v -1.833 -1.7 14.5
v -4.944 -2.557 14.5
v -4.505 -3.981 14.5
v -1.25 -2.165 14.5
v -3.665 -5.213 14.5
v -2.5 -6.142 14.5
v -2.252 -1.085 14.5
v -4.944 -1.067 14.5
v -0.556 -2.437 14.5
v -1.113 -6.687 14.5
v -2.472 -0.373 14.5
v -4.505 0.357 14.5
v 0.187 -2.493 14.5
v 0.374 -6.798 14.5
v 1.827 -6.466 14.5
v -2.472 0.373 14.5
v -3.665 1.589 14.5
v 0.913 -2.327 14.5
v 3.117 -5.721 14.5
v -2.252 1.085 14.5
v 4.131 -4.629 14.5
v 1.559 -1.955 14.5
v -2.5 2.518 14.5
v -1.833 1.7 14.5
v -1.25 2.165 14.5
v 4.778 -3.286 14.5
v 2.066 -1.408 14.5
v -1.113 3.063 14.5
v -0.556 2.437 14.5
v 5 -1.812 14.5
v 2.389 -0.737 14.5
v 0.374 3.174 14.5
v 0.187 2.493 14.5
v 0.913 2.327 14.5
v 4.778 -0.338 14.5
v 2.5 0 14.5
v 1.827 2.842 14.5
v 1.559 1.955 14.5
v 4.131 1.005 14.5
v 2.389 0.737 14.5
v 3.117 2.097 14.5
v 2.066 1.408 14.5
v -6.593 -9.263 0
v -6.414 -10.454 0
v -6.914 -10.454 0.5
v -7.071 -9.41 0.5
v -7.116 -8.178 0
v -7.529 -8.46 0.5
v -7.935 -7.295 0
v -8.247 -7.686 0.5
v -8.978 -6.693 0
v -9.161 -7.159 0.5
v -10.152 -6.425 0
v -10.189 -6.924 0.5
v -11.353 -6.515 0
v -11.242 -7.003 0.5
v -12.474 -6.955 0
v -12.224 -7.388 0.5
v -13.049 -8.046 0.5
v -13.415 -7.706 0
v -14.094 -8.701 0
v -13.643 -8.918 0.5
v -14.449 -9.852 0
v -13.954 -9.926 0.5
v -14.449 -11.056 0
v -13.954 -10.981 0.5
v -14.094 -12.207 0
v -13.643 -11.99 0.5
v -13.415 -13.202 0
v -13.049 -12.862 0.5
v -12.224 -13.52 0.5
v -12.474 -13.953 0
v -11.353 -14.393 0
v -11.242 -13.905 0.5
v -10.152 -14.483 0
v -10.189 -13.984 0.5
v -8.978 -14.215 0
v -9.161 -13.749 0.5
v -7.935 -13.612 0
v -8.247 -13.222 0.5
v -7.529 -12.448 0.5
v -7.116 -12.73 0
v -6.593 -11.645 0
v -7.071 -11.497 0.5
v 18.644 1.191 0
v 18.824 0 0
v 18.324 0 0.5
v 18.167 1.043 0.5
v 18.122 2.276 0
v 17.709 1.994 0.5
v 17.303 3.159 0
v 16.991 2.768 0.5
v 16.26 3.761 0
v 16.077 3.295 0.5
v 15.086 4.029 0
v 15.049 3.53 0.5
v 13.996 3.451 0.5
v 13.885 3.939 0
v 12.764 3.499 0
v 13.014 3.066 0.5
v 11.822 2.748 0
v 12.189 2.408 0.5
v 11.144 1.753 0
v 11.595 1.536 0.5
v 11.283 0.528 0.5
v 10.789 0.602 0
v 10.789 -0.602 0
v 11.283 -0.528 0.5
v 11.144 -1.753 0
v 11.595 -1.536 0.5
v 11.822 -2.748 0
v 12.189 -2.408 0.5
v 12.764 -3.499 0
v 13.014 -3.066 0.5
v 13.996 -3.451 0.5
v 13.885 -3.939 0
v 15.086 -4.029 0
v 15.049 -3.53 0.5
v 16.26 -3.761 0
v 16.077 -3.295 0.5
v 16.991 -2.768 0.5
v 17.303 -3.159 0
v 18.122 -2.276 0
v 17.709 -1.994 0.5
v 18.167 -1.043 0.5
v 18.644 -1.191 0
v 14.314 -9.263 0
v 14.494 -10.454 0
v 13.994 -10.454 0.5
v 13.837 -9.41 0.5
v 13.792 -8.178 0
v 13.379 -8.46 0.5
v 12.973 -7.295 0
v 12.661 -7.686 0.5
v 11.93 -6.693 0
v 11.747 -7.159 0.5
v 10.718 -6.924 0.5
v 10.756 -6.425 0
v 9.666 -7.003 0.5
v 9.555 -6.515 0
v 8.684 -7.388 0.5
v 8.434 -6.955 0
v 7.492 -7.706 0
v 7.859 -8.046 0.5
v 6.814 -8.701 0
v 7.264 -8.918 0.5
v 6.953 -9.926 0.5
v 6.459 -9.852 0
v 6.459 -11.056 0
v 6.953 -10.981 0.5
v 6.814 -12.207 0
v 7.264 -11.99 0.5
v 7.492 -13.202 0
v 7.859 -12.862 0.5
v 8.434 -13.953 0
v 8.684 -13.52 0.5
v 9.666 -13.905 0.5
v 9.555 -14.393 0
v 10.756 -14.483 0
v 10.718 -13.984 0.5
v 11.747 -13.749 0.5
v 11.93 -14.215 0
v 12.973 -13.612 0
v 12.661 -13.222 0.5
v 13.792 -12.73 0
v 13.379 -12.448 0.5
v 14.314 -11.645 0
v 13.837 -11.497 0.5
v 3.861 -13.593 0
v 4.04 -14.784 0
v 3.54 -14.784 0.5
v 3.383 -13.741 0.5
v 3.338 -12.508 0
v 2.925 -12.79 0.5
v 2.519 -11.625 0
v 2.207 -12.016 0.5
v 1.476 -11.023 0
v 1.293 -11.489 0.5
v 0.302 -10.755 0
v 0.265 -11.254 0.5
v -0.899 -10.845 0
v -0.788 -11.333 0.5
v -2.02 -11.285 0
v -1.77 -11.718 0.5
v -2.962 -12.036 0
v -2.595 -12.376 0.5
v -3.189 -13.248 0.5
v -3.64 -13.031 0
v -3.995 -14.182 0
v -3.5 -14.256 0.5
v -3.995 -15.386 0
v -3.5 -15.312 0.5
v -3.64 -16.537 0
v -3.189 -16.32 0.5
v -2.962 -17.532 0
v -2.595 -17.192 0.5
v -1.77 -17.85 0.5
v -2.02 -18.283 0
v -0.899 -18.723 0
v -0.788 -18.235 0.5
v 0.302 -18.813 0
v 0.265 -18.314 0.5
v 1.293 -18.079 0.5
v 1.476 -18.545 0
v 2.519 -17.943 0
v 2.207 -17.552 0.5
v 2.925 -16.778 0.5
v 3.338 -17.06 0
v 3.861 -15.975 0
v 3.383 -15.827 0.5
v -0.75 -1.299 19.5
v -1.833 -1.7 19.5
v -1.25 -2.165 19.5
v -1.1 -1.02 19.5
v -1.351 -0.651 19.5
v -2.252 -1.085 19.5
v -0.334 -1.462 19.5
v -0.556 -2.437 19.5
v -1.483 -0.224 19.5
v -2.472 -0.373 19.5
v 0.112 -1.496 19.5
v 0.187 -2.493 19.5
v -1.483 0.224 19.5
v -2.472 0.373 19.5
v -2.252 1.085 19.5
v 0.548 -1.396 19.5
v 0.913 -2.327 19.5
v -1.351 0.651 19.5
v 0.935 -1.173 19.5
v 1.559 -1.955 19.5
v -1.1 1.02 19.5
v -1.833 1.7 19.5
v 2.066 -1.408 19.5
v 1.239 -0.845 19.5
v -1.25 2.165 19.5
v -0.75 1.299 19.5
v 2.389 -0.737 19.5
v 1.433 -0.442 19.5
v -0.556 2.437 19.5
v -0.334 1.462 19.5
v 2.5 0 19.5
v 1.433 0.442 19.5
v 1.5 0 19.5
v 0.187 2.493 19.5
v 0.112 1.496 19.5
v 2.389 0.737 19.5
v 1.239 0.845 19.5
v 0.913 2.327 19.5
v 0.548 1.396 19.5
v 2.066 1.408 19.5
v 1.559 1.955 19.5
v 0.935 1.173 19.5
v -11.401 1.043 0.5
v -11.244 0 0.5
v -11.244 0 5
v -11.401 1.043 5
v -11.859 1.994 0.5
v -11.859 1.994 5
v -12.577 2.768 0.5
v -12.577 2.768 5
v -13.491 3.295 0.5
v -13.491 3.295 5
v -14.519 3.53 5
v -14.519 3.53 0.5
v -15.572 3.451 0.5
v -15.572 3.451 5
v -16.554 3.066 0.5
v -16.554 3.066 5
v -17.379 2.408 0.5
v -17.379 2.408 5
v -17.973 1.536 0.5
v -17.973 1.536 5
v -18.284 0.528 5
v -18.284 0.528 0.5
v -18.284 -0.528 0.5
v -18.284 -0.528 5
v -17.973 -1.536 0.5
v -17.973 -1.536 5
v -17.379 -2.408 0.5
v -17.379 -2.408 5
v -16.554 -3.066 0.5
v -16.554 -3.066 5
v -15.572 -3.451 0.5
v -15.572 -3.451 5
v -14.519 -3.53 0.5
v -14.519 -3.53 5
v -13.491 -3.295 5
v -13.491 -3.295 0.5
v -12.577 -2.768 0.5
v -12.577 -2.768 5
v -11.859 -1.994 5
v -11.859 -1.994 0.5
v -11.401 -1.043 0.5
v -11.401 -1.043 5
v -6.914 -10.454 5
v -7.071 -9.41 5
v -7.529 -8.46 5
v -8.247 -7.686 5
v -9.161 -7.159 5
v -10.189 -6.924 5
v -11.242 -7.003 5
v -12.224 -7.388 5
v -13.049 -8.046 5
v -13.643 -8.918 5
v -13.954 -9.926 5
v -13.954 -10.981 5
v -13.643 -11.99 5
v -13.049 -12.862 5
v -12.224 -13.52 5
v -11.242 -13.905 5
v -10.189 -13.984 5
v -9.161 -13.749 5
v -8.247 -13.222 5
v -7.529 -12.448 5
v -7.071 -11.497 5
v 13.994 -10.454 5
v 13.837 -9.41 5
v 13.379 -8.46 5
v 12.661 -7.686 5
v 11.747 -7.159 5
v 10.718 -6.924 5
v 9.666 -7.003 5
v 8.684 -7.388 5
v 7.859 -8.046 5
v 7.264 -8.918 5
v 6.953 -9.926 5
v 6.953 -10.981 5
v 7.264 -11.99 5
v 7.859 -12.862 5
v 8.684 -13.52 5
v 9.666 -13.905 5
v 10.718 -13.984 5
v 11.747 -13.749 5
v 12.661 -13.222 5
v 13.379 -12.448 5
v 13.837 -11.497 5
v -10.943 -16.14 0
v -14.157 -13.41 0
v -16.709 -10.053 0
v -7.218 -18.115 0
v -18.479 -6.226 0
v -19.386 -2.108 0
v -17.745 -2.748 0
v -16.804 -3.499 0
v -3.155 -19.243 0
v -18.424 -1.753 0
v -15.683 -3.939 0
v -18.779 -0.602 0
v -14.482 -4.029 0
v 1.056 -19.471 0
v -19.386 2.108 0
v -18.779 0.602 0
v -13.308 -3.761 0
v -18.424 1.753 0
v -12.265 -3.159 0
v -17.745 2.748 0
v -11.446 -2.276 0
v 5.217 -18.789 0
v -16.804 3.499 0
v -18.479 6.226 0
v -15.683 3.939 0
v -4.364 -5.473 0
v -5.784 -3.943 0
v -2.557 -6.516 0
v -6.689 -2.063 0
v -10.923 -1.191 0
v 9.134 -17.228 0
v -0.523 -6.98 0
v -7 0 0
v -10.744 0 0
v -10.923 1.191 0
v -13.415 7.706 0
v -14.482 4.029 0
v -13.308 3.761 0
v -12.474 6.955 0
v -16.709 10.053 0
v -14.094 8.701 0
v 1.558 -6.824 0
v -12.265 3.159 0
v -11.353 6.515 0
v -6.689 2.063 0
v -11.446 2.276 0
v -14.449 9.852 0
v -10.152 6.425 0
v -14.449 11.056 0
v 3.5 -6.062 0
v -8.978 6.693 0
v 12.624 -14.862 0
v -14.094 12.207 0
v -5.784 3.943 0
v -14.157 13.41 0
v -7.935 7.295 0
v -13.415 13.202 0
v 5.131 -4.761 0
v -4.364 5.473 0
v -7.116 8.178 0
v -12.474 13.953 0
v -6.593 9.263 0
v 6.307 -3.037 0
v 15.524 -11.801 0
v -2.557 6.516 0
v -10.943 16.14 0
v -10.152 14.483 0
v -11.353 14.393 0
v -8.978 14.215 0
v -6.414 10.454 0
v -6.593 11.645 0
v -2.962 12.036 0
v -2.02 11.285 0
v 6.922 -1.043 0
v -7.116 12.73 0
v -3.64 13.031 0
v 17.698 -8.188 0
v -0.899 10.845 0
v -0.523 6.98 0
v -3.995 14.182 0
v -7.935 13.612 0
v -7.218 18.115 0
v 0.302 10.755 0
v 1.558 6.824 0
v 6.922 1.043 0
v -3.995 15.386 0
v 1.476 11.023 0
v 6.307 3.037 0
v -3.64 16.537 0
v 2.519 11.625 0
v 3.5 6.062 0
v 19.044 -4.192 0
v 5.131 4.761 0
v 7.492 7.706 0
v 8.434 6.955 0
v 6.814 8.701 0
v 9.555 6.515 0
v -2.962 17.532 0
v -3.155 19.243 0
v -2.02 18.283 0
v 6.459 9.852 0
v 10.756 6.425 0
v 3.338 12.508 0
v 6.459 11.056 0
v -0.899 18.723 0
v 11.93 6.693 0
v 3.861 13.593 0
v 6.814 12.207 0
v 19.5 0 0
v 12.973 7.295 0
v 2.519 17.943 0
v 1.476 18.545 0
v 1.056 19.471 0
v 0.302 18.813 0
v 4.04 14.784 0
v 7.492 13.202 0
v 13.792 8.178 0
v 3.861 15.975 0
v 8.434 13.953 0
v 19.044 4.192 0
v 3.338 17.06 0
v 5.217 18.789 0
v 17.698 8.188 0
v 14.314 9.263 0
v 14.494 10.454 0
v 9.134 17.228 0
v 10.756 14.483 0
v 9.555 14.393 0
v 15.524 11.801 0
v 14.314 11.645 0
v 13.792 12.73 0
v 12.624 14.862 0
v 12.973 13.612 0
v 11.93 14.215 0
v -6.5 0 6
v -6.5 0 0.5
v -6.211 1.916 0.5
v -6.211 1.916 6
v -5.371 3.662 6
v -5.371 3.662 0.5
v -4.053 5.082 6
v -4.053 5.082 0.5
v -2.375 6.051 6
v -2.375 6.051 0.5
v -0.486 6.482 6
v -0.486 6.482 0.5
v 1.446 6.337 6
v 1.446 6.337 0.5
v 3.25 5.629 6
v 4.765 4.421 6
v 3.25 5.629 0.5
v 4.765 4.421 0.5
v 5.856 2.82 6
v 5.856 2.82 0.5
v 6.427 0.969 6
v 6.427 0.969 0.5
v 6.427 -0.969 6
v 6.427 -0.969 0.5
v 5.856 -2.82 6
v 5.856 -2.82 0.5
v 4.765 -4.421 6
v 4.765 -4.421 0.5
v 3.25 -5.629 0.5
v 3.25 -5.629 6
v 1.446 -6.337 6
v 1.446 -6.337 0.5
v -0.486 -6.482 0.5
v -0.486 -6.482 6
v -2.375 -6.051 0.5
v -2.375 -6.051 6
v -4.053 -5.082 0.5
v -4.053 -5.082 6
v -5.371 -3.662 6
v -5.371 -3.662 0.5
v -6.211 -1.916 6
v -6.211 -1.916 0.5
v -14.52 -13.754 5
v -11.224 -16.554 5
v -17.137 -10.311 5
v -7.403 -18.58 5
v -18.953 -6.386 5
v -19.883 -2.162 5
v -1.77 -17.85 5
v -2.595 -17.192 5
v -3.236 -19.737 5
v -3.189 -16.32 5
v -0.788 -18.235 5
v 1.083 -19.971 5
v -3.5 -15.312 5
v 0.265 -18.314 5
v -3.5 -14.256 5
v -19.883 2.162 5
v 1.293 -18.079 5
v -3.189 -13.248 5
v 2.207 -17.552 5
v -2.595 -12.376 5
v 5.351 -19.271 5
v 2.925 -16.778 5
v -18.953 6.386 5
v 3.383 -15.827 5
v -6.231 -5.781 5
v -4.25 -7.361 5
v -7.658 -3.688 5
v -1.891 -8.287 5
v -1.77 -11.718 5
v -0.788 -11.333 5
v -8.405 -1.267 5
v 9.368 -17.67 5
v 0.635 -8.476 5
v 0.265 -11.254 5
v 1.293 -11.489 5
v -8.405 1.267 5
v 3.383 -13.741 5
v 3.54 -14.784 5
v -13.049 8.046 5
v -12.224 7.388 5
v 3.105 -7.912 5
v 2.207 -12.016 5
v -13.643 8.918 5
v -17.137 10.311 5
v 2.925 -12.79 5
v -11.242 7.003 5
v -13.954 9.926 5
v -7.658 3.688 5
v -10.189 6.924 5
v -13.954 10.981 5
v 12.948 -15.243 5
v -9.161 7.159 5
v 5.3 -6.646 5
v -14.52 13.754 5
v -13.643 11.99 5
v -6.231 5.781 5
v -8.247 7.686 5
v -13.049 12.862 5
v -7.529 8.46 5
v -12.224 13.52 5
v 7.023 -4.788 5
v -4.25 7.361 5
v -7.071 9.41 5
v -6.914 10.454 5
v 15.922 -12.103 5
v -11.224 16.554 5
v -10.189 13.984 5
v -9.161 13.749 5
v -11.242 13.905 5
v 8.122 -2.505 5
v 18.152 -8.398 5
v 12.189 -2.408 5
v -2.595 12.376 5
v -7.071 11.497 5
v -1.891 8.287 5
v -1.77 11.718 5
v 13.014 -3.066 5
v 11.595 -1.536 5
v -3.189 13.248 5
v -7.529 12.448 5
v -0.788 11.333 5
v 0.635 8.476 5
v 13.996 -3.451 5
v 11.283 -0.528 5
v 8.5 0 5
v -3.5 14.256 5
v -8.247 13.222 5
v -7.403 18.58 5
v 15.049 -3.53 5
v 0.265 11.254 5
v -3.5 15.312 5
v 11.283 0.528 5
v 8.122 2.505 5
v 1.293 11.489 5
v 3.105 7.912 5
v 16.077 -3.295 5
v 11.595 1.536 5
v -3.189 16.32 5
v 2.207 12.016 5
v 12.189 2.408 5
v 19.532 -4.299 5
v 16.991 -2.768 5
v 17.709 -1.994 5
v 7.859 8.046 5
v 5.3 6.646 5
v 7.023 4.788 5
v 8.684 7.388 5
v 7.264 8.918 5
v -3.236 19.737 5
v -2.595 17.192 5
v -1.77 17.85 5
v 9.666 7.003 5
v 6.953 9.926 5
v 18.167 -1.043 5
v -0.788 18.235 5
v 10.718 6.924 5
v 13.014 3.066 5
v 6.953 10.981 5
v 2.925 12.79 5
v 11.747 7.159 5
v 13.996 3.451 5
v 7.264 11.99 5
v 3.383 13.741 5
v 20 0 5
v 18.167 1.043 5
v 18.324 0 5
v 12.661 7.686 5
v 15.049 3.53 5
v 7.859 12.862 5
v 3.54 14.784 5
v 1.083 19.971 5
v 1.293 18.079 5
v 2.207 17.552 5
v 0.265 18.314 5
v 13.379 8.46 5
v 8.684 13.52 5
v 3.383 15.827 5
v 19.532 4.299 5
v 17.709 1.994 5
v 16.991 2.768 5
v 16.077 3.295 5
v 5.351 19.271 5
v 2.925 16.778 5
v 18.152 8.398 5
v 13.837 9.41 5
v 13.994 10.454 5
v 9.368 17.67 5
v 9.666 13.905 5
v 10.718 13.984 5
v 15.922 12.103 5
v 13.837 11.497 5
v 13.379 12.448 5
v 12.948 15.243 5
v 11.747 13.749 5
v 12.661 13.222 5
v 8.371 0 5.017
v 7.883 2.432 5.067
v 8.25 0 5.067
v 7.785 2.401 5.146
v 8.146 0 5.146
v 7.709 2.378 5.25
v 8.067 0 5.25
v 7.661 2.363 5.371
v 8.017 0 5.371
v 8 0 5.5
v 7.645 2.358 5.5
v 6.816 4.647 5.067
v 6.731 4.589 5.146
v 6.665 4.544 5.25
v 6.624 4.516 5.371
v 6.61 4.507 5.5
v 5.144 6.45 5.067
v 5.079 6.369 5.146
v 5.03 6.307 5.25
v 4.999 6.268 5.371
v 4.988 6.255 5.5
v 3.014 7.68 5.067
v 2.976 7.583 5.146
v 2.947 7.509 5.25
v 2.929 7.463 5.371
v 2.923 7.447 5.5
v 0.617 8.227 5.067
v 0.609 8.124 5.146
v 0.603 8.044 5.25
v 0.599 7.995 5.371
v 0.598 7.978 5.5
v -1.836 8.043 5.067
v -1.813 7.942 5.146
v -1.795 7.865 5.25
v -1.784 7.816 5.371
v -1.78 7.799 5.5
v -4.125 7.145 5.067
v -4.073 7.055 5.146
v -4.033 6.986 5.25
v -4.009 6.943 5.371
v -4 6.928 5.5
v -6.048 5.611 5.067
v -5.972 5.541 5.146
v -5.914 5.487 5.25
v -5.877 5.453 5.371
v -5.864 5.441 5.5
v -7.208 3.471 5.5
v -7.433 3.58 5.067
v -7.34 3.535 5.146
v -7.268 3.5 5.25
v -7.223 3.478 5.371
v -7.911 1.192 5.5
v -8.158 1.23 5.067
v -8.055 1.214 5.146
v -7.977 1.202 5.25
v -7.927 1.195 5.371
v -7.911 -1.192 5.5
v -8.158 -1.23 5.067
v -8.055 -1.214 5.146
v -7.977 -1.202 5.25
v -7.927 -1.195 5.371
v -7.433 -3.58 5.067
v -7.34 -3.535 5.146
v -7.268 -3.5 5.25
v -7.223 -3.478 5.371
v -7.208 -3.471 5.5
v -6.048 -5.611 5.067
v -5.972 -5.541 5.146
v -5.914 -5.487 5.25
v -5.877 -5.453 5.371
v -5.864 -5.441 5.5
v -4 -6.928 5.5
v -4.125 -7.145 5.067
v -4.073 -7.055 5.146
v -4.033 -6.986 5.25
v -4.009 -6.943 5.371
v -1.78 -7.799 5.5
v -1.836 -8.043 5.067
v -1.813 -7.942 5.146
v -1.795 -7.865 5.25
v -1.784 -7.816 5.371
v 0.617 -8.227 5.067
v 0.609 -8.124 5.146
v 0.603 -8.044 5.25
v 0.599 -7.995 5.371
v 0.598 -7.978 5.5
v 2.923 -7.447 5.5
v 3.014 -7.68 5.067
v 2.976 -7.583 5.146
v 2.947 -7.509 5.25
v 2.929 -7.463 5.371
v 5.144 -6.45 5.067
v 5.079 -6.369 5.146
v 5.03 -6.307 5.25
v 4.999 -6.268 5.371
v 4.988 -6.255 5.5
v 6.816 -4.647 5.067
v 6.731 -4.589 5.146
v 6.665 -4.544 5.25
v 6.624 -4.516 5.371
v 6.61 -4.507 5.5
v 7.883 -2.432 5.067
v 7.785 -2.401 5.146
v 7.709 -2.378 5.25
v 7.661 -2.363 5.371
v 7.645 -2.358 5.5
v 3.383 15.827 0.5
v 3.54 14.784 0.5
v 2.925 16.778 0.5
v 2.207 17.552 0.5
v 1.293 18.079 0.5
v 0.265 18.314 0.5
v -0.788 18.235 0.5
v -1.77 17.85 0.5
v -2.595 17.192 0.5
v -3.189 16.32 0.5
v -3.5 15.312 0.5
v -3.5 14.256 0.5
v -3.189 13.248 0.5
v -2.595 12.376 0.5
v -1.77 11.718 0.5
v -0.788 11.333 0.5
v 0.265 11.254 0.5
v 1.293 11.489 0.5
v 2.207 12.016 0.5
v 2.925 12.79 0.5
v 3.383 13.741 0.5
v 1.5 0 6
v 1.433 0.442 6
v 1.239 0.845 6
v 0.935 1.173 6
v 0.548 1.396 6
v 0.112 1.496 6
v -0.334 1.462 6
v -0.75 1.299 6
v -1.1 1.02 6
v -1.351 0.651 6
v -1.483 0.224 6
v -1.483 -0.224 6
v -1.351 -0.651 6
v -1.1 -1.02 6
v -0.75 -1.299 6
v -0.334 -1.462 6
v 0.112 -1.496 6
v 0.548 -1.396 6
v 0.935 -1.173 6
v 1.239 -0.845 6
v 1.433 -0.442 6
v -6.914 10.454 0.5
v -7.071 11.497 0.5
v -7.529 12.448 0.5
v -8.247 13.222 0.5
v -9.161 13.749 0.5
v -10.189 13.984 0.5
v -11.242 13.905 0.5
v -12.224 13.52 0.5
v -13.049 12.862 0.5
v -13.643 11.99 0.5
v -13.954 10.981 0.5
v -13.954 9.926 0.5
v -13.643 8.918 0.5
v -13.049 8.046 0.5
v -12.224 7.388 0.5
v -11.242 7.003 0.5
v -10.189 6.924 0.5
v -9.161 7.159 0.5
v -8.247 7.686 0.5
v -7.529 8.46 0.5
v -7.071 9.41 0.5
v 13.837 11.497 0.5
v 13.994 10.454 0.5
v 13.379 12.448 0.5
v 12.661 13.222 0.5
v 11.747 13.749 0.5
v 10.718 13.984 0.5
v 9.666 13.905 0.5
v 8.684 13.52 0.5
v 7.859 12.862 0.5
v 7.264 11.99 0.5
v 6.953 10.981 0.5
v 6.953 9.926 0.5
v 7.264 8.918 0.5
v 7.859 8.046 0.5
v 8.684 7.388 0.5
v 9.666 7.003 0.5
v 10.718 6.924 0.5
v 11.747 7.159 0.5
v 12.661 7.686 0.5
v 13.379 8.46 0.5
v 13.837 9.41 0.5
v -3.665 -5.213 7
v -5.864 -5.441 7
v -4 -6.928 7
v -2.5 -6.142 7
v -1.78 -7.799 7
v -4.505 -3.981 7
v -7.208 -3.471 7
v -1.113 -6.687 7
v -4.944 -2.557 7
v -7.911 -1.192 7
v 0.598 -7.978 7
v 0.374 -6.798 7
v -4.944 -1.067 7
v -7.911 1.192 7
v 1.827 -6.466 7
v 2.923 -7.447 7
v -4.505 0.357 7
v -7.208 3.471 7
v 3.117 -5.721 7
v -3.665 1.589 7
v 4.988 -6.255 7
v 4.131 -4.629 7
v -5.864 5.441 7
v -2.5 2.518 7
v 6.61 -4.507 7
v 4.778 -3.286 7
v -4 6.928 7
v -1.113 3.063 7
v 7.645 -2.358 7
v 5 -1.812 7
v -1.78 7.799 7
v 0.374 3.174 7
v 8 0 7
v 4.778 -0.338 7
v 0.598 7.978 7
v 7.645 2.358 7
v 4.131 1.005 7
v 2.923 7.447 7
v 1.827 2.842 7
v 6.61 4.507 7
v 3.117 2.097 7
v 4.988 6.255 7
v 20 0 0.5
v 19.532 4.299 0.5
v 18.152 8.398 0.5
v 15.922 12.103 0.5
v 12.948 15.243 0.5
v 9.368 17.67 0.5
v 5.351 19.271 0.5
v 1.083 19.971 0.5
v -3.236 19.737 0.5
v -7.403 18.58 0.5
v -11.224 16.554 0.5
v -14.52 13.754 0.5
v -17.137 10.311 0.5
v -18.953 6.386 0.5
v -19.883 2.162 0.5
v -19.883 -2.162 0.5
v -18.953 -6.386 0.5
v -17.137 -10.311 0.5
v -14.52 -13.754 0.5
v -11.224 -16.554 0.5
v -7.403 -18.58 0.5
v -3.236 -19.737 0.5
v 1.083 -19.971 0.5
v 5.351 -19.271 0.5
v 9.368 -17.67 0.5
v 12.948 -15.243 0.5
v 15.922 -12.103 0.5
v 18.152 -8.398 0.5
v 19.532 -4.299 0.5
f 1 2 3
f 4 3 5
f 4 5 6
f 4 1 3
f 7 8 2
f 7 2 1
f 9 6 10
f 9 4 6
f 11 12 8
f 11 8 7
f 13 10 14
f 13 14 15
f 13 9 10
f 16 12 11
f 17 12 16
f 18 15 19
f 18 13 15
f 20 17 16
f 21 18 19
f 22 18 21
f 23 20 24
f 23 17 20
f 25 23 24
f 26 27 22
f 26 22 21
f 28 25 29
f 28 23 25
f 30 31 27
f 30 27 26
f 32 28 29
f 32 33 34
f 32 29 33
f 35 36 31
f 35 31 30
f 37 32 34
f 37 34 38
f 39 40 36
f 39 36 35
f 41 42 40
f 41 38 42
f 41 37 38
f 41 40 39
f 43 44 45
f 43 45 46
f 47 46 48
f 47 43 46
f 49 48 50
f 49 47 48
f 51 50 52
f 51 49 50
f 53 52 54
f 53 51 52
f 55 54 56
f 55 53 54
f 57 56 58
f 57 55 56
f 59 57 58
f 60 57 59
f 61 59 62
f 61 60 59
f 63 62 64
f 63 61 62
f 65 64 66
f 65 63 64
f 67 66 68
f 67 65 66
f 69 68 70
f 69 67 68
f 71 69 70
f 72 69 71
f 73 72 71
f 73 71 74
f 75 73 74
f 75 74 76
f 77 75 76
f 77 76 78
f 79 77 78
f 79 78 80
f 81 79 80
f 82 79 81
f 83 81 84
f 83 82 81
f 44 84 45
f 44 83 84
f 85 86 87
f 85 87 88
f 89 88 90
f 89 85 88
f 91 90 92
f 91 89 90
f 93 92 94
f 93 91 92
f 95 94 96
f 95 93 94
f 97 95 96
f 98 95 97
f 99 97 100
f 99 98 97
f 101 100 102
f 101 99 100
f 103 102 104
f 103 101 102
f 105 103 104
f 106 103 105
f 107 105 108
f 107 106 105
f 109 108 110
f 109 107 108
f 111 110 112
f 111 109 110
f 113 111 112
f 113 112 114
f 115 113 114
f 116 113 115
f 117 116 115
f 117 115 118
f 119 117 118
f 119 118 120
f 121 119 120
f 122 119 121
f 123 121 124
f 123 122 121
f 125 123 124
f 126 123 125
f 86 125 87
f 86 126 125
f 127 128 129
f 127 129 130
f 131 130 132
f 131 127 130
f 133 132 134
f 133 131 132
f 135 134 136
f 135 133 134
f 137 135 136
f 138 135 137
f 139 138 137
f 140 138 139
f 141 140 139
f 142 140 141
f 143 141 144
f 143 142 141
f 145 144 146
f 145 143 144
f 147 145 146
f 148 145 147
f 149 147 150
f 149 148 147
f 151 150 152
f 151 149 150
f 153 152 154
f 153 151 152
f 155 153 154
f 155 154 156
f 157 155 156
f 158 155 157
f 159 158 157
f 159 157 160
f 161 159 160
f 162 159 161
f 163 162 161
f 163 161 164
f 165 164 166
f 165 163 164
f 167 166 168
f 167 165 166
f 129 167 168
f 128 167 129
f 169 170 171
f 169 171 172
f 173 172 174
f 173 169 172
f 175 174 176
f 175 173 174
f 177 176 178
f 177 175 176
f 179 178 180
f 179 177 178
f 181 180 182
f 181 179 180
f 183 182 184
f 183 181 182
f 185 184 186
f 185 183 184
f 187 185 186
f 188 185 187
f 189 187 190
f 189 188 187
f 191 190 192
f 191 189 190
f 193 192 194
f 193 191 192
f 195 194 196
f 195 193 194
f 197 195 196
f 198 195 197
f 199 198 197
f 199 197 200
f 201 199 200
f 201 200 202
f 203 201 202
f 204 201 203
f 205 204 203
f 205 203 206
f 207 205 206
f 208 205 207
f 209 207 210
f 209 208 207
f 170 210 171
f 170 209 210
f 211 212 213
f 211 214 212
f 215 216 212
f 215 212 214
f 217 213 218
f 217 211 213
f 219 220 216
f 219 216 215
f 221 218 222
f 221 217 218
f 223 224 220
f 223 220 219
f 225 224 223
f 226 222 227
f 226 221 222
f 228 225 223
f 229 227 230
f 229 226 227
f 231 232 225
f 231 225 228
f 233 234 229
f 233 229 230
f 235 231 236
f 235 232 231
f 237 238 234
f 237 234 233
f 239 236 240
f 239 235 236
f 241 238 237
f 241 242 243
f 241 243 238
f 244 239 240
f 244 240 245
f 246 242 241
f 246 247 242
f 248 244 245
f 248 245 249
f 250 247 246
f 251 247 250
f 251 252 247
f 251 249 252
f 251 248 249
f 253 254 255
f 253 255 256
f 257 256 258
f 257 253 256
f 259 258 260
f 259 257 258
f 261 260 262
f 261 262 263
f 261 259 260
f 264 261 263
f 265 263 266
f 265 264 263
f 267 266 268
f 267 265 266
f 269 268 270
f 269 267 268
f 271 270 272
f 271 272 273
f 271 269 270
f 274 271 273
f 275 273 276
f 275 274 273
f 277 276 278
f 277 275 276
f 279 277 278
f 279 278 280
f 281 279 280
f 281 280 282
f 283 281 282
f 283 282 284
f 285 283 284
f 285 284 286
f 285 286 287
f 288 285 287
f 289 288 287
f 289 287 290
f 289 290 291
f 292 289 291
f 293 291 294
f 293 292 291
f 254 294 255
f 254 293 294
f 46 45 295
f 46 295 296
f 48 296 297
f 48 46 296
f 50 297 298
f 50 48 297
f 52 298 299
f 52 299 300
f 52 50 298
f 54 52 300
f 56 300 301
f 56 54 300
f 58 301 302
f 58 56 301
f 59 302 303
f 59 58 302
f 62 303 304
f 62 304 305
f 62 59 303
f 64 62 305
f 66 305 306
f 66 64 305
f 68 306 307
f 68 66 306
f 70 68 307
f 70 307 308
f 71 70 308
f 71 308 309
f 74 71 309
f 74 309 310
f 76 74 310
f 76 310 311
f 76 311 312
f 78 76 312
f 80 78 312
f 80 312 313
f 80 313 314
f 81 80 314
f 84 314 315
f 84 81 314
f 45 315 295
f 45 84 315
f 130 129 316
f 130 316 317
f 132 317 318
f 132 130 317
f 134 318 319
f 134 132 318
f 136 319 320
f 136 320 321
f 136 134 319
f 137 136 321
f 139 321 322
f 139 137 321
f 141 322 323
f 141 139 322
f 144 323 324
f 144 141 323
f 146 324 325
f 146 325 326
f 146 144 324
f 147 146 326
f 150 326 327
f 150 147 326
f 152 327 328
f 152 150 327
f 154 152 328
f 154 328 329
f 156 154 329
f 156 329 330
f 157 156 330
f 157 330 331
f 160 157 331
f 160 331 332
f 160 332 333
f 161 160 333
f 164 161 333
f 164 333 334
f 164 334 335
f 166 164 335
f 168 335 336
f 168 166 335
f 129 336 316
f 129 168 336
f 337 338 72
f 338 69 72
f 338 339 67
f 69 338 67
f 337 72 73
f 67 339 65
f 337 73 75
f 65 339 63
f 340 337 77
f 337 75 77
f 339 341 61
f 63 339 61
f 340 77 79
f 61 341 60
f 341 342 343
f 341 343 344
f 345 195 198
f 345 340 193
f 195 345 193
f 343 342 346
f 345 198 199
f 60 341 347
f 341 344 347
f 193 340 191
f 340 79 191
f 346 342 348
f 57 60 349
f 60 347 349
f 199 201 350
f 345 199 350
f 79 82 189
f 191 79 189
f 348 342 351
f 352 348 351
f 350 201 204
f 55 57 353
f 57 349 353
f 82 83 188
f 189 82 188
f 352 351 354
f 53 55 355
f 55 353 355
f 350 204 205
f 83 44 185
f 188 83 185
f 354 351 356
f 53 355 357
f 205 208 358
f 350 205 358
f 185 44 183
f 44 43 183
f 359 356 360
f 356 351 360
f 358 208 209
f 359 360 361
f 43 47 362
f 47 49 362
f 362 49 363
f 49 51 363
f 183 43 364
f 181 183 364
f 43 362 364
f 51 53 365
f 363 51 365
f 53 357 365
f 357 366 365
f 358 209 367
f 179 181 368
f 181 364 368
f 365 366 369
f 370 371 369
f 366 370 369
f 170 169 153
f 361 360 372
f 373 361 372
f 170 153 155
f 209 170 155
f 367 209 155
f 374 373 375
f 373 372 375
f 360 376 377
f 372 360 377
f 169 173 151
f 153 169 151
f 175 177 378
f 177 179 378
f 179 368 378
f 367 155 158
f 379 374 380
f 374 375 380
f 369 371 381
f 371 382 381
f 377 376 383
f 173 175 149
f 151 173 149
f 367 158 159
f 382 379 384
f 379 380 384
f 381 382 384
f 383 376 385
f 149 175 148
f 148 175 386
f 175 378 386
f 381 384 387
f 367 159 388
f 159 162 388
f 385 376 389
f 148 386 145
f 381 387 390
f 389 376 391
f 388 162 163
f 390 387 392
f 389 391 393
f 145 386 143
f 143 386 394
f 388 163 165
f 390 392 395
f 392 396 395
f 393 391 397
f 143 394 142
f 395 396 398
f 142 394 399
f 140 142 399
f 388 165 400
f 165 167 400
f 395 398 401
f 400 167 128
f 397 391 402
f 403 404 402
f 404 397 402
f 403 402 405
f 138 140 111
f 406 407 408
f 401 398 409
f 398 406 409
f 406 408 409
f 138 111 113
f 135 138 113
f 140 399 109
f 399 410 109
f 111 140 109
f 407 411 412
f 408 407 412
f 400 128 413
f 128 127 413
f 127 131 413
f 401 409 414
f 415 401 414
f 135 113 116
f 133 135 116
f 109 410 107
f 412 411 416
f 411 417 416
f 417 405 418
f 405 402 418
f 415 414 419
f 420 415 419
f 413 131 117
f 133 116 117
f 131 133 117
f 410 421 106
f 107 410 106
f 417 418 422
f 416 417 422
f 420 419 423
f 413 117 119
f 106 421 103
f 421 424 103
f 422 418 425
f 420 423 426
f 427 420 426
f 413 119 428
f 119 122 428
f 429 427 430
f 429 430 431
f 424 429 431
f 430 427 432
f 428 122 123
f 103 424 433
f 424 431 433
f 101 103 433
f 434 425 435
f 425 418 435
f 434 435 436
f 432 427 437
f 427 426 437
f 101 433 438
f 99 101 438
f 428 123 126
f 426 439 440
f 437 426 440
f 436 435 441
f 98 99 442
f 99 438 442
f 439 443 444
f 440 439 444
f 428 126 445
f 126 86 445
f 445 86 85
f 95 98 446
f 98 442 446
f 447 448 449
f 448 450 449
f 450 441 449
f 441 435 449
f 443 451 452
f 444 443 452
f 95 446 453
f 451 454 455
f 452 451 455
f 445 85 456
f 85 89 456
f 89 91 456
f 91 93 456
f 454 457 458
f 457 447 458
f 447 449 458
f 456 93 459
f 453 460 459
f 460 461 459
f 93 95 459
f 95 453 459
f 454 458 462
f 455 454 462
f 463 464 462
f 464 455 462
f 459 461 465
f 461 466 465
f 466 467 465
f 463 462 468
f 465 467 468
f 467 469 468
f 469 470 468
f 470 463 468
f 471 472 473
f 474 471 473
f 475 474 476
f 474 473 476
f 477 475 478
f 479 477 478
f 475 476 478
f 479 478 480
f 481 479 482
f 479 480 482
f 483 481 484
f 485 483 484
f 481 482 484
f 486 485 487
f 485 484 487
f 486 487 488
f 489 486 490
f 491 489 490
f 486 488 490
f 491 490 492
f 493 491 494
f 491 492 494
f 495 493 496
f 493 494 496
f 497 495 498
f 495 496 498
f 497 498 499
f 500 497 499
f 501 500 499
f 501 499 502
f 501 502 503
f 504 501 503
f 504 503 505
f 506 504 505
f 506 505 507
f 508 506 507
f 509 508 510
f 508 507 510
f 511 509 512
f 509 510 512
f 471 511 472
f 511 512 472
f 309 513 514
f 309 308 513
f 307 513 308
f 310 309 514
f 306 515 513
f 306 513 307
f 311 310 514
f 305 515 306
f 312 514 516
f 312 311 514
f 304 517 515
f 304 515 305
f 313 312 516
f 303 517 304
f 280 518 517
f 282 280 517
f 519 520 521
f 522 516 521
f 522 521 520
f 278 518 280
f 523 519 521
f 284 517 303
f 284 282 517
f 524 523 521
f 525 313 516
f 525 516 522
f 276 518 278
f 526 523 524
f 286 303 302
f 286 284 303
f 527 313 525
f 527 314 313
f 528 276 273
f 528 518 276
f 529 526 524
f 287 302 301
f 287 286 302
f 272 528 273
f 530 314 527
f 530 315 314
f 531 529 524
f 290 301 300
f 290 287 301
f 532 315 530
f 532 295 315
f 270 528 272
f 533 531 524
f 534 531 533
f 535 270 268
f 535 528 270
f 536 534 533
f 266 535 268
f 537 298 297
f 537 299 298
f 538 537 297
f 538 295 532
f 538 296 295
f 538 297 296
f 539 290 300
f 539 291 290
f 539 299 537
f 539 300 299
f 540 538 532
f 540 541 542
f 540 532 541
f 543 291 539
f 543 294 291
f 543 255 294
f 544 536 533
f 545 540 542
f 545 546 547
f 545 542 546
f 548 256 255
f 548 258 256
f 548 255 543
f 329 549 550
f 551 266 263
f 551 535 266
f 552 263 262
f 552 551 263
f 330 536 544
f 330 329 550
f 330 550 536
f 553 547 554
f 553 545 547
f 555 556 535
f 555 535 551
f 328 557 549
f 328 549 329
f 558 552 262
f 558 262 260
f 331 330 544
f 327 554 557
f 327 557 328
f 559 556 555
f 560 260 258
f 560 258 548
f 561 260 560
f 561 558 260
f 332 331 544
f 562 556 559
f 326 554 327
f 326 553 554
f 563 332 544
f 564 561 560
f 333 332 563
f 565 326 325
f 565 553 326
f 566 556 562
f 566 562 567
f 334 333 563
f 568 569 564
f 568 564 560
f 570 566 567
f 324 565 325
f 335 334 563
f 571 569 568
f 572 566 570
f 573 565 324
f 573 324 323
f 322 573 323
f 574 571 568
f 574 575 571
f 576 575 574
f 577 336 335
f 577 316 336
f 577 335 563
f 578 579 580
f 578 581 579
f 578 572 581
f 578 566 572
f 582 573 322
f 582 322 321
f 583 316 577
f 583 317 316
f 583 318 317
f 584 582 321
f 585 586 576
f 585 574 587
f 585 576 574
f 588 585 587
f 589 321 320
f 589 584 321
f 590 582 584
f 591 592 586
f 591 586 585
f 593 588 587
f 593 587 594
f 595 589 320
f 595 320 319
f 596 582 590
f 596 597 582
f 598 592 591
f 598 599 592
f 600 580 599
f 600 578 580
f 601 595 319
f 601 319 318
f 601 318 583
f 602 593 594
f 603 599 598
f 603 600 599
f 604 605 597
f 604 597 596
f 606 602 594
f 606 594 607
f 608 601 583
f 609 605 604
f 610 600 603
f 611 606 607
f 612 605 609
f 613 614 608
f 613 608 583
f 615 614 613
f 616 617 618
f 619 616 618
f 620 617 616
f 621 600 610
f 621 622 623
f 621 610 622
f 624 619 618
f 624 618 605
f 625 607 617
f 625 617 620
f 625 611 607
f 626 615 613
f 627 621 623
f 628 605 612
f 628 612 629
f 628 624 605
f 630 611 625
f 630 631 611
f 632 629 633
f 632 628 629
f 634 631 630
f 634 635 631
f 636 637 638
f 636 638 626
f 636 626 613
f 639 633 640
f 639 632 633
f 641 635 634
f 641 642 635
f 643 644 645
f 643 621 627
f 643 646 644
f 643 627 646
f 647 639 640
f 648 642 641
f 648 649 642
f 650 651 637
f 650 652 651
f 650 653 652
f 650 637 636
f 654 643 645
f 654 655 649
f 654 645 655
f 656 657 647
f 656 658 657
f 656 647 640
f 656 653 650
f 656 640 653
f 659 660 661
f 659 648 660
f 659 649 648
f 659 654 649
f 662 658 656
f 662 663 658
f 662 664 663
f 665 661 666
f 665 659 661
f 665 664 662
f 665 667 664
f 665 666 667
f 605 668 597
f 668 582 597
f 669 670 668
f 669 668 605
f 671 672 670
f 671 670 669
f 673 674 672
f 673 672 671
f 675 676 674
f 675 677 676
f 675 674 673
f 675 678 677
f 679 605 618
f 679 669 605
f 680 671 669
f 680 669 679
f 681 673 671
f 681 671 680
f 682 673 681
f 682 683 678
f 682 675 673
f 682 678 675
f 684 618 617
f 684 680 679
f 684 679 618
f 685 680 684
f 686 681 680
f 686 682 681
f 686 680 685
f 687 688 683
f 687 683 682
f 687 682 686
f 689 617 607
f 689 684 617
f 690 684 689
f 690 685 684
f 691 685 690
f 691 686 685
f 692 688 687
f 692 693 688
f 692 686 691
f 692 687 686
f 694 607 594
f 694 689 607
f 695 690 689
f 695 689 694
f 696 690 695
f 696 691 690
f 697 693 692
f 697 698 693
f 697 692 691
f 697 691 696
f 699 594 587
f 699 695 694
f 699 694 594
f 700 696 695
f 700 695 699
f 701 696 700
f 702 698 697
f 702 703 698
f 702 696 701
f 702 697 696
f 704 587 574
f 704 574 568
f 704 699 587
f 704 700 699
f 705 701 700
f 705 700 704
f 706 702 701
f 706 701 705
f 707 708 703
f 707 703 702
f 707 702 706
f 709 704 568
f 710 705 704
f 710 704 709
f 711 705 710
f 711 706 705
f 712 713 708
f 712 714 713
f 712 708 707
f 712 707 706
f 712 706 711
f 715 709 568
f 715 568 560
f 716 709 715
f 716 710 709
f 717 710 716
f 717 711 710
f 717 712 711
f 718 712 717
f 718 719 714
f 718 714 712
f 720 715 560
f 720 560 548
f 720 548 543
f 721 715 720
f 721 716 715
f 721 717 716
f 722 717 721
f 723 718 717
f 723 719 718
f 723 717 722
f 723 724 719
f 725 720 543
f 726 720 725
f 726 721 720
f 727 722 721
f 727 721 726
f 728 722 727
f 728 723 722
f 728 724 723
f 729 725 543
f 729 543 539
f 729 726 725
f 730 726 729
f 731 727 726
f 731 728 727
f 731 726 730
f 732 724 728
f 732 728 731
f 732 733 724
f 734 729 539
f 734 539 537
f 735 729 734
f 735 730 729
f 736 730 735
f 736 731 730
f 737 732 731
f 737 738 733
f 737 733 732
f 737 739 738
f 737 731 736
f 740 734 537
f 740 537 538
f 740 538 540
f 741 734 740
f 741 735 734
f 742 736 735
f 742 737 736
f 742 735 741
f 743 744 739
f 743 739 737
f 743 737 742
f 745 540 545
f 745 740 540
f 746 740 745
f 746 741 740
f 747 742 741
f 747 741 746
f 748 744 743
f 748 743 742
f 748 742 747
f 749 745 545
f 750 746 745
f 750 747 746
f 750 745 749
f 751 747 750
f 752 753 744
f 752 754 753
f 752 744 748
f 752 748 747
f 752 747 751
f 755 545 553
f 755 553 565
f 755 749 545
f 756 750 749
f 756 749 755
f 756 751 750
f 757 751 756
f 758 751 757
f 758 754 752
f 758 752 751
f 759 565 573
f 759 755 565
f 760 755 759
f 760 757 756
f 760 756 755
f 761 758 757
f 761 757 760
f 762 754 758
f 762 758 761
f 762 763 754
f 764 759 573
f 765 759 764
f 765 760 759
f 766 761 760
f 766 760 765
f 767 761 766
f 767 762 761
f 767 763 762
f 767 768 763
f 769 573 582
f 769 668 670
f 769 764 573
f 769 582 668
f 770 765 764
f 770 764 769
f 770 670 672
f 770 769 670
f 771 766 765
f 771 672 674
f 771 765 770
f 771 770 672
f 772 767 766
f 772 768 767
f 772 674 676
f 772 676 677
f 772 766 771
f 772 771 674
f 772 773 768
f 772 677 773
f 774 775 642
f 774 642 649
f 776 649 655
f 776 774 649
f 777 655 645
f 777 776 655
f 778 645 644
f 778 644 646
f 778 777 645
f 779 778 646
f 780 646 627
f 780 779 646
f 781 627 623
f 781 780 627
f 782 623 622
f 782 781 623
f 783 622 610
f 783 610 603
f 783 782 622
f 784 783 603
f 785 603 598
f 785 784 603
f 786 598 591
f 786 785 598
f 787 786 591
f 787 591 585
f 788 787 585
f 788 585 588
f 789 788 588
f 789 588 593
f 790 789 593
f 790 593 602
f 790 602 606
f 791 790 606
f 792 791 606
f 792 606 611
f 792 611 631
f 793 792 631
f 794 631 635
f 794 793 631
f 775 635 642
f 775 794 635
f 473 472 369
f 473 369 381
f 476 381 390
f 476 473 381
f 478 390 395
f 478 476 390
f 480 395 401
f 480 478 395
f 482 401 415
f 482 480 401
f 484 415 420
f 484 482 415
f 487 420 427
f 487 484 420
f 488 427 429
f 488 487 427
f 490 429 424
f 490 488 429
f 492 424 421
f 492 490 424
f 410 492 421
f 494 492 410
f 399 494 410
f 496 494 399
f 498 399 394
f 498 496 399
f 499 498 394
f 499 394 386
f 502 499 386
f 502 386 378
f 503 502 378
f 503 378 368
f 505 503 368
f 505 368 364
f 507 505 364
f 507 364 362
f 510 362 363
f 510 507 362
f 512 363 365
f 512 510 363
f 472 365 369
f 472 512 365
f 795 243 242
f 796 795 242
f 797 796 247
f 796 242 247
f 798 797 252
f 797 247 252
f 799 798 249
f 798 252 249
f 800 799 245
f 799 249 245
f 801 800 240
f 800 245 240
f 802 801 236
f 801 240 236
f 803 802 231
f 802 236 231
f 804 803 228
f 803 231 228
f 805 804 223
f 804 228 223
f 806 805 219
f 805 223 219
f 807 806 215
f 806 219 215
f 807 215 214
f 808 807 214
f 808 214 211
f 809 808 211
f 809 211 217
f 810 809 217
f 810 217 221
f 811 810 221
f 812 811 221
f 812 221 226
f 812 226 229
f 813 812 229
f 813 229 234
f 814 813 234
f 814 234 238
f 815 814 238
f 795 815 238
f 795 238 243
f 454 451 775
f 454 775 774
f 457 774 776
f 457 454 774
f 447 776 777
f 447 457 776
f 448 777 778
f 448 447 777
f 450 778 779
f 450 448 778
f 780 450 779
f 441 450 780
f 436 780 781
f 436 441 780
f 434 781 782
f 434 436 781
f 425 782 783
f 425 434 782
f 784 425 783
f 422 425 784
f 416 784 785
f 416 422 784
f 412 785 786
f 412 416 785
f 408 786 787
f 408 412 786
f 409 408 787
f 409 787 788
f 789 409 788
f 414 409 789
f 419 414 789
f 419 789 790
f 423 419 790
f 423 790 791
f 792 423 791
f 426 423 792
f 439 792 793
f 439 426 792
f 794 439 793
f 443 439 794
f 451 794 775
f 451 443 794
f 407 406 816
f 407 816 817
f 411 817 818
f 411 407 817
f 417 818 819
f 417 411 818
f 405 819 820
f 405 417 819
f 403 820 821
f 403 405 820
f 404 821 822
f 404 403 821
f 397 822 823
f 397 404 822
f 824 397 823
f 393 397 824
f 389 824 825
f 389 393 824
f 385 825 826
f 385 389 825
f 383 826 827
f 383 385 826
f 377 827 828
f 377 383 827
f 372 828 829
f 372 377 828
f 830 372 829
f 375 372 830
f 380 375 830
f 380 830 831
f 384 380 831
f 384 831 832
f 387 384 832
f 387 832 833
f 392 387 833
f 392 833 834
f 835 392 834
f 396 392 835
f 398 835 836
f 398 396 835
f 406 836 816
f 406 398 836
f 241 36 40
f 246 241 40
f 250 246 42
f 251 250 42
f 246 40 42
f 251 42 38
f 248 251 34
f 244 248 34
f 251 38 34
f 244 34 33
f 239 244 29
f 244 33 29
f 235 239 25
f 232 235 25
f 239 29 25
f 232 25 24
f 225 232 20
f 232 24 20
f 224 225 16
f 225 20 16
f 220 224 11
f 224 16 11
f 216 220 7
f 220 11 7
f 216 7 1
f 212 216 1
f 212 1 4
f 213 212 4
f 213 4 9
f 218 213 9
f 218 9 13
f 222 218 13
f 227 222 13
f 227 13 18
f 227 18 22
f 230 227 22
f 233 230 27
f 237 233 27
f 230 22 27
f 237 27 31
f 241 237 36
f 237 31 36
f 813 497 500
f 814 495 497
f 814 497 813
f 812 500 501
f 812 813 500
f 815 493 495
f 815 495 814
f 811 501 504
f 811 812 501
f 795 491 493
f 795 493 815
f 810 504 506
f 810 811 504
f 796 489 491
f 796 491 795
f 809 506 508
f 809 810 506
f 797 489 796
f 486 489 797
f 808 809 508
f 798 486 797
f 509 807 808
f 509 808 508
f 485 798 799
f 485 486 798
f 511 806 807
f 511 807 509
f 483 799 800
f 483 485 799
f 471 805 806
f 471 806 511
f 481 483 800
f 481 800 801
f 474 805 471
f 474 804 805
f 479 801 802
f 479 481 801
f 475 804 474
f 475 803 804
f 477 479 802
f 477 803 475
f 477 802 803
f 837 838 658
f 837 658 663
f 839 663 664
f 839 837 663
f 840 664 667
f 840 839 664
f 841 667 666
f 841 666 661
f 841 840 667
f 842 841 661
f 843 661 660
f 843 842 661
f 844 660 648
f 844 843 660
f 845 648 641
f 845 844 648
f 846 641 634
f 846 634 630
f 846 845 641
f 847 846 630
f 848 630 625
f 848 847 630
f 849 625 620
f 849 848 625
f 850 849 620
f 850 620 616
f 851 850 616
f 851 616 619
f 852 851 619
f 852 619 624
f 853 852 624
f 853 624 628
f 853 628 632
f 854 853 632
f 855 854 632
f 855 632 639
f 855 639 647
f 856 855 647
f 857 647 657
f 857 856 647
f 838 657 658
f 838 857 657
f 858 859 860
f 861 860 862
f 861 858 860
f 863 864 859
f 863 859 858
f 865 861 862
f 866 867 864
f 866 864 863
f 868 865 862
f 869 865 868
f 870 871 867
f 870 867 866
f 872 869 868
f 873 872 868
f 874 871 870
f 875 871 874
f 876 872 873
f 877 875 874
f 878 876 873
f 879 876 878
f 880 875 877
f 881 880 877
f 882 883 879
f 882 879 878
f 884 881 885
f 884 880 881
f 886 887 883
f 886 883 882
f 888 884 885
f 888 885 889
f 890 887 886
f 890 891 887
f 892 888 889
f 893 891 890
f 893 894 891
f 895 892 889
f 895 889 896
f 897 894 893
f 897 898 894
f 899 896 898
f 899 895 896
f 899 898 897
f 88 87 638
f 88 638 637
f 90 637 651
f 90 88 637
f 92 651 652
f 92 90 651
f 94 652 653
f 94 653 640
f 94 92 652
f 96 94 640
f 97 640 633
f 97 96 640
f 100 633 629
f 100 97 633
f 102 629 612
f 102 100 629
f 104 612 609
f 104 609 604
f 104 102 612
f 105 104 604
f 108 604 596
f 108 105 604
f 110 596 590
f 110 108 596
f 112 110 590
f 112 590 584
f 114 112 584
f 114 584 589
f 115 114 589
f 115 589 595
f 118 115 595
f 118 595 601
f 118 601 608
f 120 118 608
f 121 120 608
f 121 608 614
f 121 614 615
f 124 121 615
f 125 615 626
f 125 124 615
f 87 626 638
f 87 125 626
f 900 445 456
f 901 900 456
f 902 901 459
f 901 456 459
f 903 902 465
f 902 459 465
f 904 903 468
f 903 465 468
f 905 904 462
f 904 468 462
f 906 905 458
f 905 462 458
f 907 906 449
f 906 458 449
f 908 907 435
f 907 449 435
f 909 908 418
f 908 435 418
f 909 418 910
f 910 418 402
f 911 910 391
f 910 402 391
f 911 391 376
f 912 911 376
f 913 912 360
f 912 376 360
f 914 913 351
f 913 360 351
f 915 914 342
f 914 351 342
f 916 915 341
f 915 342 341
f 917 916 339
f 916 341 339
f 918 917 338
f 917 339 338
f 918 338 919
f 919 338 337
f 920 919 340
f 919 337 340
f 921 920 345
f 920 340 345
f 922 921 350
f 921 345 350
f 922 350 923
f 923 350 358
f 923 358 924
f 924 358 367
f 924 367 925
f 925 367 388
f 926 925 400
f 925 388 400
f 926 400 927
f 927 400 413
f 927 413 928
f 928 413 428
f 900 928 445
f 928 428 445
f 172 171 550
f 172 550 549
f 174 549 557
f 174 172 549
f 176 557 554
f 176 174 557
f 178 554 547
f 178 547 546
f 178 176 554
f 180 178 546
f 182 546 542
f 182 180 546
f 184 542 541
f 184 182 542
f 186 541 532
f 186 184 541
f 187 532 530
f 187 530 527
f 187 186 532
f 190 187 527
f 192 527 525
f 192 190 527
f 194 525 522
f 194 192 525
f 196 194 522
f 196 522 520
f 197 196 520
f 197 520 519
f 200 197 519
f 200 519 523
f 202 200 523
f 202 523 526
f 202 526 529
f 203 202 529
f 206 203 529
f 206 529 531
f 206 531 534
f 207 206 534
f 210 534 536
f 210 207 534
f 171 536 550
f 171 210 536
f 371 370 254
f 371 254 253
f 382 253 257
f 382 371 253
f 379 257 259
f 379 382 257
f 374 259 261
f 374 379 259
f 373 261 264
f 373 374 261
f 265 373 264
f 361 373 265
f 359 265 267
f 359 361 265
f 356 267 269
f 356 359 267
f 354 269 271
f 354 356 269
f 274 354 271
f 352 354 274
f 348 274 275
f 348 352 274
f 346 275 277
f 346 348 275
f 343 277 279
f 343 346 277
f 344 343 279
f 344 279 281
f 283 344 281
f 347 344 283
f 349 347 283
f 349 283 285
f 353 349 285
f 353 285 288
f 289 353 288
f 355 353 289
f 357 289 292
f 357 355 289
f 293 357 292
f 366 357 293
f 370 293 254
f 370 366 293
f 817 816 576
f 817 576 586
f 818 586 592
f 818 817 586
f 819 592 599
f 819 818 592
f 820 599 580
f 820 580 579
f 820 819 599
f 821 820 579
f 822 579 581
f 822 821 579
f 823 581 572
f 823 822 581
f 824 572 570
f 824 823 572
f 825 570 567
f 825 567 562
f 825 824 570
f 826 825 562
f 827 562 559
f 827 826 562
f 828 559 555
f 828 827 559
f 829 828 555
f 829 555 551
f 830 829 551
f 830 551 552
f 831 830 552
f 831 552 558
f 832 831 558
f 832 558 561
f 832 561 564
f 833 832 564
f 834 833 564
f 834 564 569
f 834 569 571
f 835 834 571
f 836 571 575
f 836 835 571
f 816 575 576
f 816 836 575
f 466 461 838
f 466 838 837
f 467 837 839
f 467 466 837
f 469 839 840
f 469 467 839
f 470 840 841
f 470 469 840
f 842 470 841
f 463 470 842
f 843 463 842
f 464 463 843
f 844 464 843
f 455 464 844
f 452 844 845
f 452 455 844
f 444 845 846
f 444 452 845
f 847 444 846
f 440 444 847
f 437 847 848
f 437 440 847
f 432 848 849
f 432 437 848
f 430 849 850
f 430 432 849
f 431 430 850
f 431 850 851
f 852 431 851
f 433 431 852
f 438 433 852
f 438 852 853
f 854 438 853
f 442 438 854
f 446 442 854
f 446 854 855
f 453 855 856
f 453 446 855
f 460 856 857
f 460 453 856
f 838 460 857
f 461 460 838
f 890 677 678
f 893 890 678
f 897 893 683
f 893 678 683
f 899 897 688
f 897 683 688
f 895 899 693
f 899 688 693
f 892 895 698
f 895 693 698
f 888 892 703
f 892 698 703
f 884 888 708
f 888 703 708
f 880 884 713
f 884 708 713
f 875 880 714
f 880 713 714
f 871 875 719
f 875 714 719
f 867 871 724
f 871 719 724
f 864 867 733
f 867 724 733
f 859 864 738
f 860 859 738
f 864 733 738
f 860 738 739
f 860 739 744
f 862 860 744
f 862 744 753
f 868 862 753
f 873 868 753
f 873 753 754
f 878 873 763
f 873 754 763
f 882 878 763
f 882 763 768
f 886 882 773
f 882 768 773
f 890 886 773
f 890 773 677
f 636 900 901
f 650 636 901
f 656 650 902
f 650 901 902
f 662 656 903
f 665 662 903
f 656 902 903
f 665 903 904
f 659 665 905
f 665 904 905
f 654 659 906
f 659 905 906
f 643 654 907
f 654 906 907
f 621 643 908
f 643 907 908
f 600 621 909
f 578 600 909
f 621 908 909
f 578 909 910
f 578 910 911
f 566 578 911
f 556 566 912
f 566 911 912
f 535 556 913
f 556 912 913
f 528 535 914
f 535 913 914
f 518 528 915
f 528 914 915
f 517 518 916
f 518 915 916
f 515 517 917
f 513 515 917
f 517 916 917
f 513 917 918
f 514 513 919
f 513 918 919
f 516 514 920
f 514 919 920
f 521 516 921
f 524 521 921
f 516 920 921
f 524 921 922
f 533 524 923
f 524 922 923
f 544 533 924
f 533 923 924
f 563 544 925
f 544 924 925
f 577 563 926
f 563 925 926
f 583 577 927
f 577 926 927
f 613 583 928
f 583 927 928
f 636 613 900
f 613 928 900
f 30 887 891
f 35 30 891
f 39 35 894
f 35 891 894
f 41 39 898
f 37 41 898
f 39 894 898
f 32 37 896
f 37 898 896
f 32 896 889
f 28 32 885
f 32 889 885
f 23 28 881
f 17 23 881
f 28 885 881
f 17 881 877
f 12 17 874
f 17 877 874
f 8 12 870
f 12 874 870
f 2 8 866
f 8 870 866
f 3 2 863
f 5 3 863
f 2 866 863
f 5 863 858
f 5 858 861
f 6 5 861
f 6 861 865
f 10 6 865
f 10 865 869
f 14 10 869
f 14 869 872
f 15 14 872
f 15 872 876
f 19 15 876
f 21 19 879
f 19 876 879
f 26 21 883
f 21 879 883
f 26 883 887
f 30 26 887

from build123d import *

# Parameters (mm, degrees)
SKETCH1_R           = 20
SKETCH1_R_2         = 3.54
BOSS_EXTRUDE1_DEPTH = 5
SKETCH2_R           = 8
BOSS_EXTRUDE2_DEPTH = 2
SKETCH3_R           = 6.5
CUT_EXTRUDE1_DEPTH  = 6
SKETCH4_R           = 5
BOSS_EXTRUDE3_DEPTH = 7.5
SKETCH5_R           = 2.5
BOSS_EXTRUDE4_DEPTH = 5
FILLET1_R           = 0.5
CHAMFER1_SIZE       = 0.5
SKETCH7_R           = 1.5
CUT_EXTRUDE2_DEPTH  = 15


with BuildPart() as part:
    # Sketch1 → Boss-Extrude1 (new body)
    with BuildSketch(Plane.XY):
        Circle(SKETCH1_R)
        with Locations((-14.783956386, 0)):
            Circle(SKETCH1_R_2, mode=Mode.SUBTRACT)
        with Locations((-10.453835814, -10.453835814)):
            Circle(SKETCH1_R_2, mode=Mode.SUBTRACT)
        with Locations((0, -14.783956386)):
            Circle(SKETCH1_R_2, mode=Mode.SUBTRACT)
        with Locations((10.453835814, -10.453835814)):
            Circle(SKETCH1_R_2, mode=Mode.SUBTRACT)
        with Locations((14.783956386, 0)):
            Circle(SKETCH1_R_2, mode=Mode.SUBTRACT)
        with Locations((10.453835814, 10.453835814)):
            Circle(SKETCH1_R_2, mode=Mode.SUBTRACT)
        with Locations((0, 14.783956386)):
            Circle(SKETCH1_R_2, mode=Mode.SUBTRACT)
        with Locations((-10.453835814, 10.453835814)):
            Circle(SKETCH1_R_2, mode=Mode.SUBTRACT)
    extrude(amount=BOSS_EXTRUDE1_DEPTH)

    # Sketch2 → Boss-Extrude2 (add)
    with BuildSketch(Plane.XY.offset(5)):
        Circle(SKETCH2_R)
    extrude(amount=BOSS_EXTRUDE2_DEPTH)

    # Sketch3 → Cut-Extrude1 (cut)
    with BuildSketch(Plane(origin=(0, 0, 0), x_dir=(-1, 0, 0), z_dir=(0, 0, -1))):
        Circle(SKETCH3_R)
    extrude(amount=-CUT_EXTRUDE1_DEPTH, mode=Mode.SUBTRACT)

    # Sketch4 → Boss-Extrude3 (add)
    with BuildSketch(Plane.XY.offset(7)):
        with Locations((0, -1.812)):
            Circle(SKETCH4_R)
    extrude(amount=BOSS_EXTRUDE3_DEPTH)

    # Sketch5 → Boss-Extrude4 (add)
    with BuildSketch(Plane.XY.offset(14.5)):
        Circle(SKETCH5_R)
    extrude(amount=BOSS_EXTRUDE4_DEPTH)

    # Fillet1
    fillet1_edges = [part.edges().sort_by_distance(p)[0] for p in [
        (-8, 0, 5),
    ]]
    fillet(fillet1_edges, radius=FILLET1_R)

    # Chamfer1
    chamfer1_edges = [part.edges().sort_by_distance(p)[0] for p in [
        (-3.54, -14.783956386, 0),
        (6.913835814, -10.453835814, 0),
        (-20, 0, 0),
        (11.243956386, 0, 0),
        (6.913835814, 10.453835814, 0),
        (-3.54, 14.783956386, 0),
        (-13.993835814, 10.453835814, 0),
        (6.5, 0, 0),
        (-18.323956386, 0, 0),
        (-13.993835814, -10.453835814, 0),
    ]]
    chamfer(chamfer1_edges, length=CHAMFER1_SIZE)

    # Sketch7 → Cut-Extrude2 (cut)
    with BuildSketch(Plane.XY.offset(19.5)):
        Circle(SKETCH7_R)
    extrude(amount=-CUT_EXTRUDE2_DEPTH, mode=Mode.SUBTRACT)


solid = part.part
